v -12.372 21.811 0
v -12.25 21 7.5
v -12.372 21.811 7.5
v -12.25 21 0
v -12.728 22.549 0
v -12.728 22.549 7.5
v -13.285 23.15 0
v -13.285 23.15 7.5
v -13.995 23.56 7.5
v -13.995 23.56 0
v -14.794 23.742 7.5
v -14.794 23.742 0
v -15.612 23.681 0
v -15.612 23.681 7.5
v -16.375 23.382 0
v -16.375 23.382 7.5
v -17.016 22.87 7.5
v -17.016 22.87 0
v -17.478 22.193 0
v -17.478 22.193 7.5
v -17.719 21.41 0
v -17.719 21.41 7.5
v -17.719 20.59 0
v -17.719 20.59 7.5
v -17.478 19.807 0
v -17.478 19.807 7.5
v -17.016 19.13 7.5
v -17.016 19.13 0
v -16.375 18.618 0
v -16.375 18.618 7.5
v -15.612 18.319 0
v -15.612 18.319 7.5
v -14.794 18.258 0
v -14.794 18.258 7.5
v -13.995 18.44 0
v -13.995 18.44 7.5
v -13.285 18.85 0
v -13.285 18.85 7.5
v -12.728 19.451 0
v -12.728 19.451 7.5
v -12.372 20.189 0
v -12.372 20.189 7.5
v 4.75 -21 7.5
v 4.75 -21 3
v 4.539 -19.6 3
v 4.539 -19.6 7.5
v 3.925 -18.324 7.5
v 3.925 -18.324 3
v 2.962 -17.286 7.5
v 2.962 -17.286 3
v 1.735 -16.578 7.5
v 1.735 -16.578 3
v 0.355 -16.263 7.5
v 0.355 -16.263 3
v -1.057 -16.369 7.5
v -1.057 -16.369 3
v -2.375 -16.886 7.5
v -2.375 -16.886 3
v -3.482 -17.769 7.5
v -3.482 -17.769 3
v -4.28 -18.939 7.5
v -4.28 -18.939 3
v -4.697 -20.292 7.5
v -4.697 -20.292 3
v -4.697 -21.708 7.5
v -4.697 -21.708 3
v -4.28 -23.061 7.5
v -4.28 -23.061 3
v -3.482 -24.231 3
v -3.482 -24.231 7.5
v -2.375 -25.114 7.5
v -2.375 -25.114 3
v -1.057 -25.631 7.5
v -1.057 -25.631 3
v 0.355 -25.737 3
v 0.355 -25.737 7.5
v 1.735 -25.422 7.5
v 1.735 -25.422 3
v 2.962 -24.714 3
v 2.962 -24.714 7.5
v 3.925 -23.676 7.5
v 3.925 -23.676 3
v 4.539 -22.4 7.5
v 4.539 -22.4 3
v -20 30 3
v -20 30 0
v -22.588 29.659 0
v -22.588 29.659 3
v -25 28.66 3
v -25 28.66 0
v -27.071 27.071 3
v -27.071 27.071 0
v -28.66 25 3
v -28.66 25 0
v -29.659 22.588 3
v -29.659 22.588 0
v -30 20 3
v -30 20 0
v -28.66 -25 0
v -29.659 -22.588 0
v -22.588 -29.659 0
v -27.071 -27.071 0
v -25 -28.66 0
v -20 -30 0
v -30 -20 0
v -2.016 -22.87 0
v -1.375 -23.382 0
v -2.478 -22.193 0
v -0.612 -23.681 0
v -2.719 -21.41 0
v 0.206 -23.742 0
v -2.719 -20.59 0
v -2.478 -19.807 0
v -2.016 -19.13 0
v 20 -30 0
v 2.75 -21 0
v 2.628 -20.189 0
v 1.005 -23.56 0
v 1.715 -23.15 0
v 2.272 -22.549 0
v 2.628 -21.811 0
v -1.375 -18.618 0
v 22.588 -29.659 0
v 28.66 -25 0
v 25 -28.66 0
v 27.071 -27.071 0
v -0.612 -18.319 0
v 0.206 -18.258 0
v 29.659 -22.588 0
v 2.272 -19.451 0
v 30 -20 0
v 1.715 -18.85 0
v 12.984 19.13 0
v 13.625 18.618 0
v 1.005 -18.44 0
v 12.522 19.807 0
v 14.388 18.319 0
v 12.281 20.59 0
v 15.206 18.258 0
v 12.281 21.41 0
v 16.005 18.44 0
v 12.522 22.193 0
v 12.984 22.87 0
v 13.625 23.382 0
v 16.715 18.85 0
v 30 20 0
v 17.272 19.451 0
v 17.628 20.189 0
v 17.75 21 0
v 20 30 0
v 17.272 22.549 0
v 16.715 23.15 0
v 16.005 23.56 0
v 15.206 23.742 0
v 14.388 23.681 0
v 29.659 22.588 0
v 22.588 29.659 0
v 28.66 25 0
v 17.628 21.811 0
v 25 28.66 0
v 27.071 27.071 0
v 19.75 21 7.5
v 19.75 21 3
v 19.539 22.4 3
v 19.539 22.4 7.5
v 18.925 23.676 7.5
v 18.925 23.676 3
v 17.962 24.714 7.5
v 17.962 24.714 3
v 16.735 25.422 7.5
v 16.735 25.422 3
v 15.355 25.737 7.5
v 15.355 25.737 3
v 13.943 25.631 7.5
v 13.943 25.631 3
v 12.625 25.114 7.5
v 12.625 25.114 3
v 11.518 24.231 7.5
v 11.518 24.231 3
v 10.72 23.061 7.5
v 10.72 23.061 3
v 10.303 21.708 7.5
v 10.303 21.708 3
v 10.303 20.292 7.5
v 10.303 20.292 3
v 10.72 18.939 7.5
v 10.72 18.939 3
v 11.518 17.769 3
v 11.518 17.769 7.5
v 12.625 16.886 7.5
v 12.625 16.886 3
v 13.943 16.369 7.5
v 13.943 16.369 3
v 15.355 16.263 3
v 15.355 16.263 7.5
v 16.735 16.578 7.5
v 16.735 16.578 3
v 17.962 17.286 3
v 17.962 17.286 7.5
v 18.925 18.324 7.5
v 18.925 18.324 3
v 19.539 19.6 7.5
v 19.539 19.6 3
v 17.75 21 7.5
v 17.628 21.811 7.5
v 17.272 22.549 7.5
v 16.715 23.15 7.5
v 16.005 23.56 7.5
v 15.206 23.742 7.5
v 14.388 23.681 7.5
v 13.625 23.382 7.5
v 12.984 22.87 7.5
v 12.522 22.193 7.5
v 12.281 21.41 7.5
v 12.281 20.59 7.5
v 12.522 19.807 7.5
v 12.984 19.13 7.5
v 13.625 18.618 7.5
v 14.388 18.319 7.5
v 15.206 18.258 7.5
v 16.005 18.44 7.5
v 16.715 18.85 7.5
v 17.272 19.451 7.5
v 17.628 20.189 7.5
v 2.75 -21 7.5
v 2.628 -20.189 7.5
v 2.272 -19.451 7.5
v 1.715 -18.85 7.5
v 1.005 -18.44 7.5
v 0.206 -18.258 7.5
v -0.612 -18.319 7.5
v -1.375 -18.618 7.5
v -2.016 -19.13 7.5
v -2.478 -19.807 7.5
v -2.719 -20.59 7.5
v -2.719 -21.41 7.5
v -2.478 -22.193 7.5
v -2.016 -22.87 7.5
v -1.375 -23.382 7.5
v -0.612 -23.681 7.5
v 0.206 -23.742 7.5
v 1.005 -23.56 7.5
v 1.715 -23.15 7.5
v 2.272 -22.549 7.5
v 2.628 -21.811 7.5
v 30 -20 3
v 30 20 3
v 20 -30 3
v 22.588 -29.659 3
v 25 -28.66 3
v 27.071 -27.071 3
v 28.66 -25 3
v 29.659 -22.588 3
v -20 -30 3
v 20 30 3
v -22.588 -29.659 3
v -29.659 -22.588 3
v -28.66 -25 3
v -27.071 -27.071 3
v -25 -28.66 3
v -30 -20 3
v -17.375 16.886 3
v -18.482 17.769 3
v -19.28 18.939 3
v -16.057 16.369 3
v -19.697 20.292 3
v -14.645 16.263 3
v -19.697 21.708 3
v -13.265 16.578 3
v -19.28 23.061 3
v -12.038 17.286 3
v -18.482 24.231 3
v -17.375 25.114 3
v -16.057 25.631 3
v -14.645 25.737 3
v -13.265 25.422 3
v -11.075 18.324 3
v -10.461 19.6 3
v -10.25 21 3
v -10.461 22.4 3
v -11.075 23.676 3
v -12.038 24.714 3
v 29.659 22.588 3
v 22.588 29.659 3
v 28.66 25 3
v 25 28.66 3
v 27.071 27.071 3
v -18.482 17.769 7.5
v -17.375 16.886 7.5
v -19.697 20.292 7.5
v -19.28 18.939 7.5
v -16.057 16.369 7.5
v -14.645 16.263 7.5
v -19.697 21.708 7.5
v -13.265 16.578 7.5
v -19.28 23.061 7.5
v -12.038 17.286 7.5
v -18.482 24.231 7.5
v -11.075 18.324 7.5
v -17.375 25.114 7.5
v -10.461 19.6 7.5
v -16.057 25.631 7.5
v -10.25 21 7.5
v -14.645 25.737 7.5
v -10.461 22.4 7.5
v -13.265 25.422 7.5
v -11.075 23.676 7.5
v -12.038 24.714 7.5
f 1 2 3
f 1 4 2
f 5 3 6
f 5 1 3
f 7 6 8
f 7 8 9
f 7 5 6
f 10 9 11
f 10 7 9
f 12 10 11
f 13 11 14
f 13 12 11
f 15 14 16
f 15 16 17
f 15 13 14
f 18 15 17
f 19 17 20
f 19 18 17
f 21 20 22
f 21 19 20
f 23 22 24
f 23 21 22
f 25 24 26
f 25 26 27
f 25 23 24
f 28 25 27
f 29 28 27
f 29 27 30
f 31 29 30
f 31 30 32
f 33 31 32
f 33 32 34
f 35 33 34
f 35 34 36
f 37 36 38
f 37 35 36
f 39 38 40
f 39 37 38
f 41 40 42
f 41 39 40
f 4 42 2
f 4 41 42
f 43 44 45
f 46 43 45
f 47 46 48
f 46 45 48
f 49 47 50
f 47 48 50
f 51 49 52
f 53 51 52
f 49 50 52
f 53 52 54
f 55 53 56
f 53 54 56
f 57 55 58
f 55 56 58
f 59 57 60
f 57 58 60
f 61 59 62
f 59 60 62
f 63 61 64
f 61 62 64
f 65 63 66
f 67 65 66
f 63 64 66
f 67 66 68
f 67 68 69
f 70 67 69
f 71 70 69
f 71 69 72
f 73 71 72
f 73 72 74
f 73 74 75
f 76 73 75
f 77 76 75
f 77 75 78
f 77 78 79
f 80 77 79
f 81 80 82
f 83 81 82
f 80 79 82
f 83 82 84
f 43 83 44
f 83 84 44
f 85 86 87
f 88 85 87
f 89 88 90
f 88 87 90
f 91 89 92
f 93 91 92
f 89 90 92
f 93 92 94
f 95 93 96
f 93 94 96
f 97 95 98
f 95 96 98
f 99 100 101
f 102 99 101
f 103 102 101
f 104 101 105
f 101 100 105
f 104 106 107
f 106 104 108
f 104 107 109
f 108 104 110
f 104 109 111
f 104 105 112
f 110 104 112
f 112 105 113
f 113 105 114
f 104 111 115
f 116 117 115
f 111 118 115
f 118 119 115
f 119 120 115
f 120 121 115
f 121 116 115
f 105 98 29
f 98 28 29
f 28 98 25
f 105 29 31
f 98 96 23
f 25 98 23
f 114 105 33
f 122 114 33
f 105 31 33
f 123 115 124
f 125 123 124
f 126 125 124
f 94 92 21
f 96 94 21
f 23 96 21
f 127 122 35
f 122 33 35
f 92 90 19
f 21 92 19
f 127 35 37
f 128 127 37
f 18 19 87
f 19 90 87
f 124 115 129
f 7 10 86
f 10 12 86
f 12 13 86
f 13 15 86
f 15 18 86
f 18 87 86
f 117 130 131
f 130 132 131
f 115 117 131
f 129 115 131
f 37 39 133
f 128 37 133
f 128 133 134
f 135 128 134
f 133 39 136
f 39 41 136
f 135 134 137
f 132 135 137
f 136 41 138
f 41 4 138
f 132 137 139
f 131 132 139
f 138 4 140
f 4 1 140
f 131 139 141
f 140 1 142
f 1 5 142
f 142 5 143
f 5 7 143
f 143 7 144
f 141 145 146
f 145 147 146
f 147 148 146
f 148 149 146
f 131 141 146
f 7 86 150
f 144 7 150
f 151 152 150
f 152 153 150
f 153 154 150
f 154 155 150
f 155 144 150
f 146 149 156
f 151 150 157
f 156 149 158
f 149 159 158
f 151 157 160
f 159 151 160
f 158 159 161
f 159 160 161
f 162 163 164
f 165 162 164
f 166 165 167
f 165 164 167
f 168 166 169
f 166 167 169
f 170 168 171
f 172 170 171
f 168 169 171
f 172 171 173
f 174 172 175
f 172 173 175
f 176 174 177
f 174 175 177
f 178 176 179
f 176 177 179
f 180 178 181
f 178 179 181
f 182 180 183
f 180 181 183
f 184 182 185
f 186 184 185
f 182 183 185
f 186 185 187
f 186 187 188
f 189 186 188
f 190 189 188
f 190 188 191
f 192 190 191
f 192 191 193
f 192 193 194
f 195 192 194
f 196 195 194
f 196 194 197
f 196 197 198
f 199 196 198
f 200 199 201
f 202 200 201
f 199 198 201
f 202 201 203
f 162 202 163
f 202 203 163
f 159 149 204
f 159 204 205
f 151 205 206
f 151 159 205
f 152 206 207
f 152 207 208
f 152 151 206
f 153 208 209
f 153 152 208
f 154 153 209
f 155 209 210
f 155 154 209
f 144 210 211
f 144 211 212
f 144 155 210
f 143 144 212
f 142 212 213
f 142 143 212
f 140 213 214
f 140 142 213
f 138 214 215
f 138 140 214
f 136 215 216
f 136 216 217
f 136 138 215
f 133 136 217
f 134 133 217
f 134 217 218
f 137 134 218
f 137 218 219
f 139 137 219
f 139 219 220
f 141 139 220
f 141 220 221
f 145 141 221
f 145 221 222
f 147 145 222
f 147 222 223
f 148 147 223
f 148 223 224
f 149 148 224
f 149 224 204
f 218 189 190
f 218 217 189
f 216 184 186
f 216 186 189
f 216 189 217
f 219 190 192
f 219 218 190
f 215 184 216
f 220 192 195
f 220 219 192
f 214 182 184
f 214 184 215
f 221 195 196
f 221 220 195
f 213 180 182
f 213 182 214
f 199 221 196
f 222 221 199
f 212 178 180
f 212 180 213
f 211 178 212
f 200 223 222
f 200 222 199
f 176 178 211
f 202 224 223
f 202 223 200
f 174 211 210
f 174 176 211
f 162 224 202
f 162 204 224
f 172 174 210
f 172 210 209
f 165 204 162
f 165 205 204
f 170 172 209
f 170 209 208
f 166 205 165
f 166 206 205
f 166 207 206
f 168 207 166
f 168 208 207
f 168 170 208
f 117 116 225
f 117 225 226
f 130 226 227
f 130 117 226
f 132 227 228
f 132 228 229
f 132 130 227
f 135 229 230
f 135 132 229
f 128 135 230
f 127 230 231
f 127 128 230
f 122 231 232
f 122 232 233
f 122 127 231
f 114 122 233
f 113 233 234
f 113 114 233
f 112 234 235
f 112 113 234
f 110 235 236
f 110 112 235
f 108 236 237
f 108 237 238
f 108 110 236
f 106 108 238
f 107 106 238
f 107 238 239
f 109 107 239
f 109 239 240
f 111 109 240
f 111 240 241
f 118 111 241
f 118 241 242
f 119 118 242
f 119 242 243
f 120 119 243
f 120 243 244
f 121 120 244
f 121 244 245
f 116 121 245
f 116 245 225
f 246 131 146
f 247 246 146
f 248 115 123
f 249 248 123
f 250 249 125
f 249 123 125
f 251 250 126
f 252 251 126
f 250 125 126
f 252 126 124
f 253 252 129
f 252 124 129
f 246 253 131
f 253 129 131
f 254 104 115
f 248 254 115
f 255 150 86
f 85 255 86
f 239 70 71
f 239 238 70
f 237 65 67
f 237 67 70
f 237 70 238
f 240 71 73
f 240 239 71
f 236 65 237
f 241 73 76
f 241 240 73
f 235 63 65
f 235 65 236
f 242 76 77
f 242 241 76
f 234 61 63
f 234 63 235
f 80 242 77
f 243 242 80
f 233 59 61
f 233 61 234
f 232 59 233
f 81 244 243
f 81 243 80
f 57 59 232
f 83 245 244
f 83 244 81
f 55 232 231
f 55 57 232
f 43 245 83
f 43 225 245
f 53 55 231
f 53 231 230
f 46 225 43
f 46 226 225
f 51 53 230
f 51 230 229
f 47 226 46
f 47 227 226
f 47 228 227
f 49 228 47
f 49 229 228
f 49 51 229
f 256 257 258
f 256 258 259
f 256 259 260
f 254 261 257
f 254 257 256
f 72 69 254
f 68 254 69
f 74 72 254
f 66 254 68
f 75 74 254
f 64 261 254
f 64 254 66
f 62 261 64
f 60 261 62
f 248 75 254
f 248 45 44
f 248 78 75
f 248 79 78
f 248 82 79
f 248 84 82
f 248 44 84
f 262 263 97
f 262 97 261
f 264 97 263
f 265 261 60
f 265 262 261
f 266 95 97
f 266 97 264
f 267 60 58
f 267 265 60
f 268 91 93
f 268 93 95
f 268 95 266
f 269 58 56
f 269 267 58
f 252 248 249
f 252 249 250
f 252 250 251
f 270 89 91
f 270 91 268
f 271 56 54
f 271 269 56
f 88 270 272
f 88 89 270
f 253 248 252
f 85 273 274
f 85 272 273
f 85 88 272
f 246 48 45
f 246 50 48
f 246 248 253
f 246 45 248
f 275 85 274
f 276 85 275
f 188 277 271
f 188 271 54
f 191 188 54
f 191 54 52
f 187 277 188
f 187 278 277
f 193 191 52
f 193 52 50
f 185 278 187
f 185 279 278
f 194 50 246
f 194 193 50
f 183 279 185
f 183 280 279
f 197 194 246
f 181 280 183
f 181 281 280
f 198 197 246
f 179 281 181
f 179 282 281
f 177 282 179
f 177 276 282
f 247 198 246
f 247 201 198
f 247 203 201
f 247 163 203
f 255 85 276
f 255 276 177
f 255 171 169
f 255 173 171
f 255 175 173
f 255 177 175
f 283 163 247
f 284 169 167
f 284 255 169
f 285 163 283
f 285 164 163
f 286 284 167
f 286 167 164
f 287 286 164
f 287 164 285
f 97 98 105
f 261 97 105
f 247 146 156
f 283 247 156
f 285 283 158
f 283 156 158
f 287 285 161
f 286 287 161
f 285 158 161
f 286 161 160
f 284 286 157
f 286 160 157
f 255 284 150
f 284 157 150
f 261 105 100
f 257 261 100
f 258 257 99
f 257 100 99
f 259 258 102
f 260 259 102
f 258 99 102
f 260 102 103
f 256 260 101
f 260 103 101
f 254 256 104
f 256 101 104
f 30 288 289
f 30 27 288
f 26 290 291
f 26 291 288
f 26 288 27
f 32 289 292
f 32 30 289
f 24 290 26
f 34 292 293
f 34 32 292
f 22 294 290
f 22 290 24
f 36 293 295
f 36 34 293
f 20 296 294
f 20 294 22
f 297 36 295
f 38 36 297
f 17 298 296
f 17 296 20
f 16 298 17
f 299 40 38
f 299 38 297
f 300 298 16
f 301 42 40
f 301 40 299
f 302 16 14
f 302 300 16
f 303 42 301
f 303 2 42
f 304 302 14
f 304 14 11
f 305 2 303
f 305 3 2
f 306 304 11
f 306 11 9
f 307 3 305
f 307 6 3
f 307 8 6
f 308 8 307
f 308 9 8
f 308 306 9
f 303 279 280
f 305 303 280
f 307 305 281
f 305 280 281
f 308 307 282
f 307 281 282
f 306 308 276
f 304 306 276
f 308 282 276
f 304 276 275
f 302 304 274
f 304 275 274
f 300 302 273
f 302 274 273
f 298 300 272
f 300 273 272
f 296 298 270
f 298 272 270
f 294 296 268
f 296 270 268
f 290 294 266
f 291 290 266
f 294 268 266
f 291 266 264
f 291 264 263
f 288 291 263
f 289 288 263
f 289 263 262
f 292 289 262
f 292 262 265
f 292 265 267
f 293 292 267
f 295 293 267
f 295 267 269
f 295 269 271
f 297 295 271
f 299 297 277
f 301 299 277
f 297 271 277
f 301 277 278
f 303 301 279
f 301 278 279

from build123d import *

# Parameters (mm, degrees)
SKETCH1_R           = 2.75
BOSS_EXTRUDE1_DEPTH = 3
SKETCH6_R           = 4.75
SKETCH6_R_2         = 2.75
BOSS_EXTRUDE3_DEPTH = 4.5


with BuildPart() as part:
    # Sketch1 → Boss-Extrude1 (new body)
    with BuildSketch(Plane.XY):
        with BuildLine():
            Line((-20, -30), (20, -30))
            ThreePointArc((20, -30), (27.071067812, -27.071067812), (30, -20))
            Line((30, -20), (30, 20))
            ThreePointArc((30, 20), (27.071067812, 27.071067812), (20, 30))
            Line((20, 30), (-20, 30))
            ThreePointArc((-20, 30), (-27.071067812, 27.071067812), (-30, 20))
            Line((-30, 20), (-30, -20))
            ThreePointArc((-30, -20), (-27.071067812, -27.071067812), (-20, -30))
        make_face()
        with Locations((-15, 21)):
            Circle(SKETCH1_R, mode=Mode.SUBTRACT)
        with Locations((0, -21)):
            Circle(SKETCH1_R, mode=Mode.SUBTRACT)
        with Locations((15, 21)):
            Circle(SKETCH1_R, mode=Mode.SUBTRACT)
    extrude(amount=BOSS_EXTRUDE1_DEPTH)

    # Sketch6 → Boss-Extrude3 (add)
    with BuildSketch(Plane.XY.offset(3)):
        with Locations((-15, 21)):
            Circle(SKETCH6_R)
        with Locations((-15, 21)):
            Circle(SKETCH6_R_2, mode=Mode.SUBTRACT)
        with Locations((0, -21)):
            Circle(SKETCH6_R)
        with Locations((0, -21)):
            Circle(SKETCH6_R_2, mode=Mode.SUBTRACT)
        with Locations((15, 21)):
            Circle(SKETCH6_R)
        with Locations((15, 21)):
            Circle(SKETCH6_R_2, mode=Mode.SUBTRACT)
    extrude(amount=BOSS_EXTRUDE3_DEPTH)


solid = part.part
